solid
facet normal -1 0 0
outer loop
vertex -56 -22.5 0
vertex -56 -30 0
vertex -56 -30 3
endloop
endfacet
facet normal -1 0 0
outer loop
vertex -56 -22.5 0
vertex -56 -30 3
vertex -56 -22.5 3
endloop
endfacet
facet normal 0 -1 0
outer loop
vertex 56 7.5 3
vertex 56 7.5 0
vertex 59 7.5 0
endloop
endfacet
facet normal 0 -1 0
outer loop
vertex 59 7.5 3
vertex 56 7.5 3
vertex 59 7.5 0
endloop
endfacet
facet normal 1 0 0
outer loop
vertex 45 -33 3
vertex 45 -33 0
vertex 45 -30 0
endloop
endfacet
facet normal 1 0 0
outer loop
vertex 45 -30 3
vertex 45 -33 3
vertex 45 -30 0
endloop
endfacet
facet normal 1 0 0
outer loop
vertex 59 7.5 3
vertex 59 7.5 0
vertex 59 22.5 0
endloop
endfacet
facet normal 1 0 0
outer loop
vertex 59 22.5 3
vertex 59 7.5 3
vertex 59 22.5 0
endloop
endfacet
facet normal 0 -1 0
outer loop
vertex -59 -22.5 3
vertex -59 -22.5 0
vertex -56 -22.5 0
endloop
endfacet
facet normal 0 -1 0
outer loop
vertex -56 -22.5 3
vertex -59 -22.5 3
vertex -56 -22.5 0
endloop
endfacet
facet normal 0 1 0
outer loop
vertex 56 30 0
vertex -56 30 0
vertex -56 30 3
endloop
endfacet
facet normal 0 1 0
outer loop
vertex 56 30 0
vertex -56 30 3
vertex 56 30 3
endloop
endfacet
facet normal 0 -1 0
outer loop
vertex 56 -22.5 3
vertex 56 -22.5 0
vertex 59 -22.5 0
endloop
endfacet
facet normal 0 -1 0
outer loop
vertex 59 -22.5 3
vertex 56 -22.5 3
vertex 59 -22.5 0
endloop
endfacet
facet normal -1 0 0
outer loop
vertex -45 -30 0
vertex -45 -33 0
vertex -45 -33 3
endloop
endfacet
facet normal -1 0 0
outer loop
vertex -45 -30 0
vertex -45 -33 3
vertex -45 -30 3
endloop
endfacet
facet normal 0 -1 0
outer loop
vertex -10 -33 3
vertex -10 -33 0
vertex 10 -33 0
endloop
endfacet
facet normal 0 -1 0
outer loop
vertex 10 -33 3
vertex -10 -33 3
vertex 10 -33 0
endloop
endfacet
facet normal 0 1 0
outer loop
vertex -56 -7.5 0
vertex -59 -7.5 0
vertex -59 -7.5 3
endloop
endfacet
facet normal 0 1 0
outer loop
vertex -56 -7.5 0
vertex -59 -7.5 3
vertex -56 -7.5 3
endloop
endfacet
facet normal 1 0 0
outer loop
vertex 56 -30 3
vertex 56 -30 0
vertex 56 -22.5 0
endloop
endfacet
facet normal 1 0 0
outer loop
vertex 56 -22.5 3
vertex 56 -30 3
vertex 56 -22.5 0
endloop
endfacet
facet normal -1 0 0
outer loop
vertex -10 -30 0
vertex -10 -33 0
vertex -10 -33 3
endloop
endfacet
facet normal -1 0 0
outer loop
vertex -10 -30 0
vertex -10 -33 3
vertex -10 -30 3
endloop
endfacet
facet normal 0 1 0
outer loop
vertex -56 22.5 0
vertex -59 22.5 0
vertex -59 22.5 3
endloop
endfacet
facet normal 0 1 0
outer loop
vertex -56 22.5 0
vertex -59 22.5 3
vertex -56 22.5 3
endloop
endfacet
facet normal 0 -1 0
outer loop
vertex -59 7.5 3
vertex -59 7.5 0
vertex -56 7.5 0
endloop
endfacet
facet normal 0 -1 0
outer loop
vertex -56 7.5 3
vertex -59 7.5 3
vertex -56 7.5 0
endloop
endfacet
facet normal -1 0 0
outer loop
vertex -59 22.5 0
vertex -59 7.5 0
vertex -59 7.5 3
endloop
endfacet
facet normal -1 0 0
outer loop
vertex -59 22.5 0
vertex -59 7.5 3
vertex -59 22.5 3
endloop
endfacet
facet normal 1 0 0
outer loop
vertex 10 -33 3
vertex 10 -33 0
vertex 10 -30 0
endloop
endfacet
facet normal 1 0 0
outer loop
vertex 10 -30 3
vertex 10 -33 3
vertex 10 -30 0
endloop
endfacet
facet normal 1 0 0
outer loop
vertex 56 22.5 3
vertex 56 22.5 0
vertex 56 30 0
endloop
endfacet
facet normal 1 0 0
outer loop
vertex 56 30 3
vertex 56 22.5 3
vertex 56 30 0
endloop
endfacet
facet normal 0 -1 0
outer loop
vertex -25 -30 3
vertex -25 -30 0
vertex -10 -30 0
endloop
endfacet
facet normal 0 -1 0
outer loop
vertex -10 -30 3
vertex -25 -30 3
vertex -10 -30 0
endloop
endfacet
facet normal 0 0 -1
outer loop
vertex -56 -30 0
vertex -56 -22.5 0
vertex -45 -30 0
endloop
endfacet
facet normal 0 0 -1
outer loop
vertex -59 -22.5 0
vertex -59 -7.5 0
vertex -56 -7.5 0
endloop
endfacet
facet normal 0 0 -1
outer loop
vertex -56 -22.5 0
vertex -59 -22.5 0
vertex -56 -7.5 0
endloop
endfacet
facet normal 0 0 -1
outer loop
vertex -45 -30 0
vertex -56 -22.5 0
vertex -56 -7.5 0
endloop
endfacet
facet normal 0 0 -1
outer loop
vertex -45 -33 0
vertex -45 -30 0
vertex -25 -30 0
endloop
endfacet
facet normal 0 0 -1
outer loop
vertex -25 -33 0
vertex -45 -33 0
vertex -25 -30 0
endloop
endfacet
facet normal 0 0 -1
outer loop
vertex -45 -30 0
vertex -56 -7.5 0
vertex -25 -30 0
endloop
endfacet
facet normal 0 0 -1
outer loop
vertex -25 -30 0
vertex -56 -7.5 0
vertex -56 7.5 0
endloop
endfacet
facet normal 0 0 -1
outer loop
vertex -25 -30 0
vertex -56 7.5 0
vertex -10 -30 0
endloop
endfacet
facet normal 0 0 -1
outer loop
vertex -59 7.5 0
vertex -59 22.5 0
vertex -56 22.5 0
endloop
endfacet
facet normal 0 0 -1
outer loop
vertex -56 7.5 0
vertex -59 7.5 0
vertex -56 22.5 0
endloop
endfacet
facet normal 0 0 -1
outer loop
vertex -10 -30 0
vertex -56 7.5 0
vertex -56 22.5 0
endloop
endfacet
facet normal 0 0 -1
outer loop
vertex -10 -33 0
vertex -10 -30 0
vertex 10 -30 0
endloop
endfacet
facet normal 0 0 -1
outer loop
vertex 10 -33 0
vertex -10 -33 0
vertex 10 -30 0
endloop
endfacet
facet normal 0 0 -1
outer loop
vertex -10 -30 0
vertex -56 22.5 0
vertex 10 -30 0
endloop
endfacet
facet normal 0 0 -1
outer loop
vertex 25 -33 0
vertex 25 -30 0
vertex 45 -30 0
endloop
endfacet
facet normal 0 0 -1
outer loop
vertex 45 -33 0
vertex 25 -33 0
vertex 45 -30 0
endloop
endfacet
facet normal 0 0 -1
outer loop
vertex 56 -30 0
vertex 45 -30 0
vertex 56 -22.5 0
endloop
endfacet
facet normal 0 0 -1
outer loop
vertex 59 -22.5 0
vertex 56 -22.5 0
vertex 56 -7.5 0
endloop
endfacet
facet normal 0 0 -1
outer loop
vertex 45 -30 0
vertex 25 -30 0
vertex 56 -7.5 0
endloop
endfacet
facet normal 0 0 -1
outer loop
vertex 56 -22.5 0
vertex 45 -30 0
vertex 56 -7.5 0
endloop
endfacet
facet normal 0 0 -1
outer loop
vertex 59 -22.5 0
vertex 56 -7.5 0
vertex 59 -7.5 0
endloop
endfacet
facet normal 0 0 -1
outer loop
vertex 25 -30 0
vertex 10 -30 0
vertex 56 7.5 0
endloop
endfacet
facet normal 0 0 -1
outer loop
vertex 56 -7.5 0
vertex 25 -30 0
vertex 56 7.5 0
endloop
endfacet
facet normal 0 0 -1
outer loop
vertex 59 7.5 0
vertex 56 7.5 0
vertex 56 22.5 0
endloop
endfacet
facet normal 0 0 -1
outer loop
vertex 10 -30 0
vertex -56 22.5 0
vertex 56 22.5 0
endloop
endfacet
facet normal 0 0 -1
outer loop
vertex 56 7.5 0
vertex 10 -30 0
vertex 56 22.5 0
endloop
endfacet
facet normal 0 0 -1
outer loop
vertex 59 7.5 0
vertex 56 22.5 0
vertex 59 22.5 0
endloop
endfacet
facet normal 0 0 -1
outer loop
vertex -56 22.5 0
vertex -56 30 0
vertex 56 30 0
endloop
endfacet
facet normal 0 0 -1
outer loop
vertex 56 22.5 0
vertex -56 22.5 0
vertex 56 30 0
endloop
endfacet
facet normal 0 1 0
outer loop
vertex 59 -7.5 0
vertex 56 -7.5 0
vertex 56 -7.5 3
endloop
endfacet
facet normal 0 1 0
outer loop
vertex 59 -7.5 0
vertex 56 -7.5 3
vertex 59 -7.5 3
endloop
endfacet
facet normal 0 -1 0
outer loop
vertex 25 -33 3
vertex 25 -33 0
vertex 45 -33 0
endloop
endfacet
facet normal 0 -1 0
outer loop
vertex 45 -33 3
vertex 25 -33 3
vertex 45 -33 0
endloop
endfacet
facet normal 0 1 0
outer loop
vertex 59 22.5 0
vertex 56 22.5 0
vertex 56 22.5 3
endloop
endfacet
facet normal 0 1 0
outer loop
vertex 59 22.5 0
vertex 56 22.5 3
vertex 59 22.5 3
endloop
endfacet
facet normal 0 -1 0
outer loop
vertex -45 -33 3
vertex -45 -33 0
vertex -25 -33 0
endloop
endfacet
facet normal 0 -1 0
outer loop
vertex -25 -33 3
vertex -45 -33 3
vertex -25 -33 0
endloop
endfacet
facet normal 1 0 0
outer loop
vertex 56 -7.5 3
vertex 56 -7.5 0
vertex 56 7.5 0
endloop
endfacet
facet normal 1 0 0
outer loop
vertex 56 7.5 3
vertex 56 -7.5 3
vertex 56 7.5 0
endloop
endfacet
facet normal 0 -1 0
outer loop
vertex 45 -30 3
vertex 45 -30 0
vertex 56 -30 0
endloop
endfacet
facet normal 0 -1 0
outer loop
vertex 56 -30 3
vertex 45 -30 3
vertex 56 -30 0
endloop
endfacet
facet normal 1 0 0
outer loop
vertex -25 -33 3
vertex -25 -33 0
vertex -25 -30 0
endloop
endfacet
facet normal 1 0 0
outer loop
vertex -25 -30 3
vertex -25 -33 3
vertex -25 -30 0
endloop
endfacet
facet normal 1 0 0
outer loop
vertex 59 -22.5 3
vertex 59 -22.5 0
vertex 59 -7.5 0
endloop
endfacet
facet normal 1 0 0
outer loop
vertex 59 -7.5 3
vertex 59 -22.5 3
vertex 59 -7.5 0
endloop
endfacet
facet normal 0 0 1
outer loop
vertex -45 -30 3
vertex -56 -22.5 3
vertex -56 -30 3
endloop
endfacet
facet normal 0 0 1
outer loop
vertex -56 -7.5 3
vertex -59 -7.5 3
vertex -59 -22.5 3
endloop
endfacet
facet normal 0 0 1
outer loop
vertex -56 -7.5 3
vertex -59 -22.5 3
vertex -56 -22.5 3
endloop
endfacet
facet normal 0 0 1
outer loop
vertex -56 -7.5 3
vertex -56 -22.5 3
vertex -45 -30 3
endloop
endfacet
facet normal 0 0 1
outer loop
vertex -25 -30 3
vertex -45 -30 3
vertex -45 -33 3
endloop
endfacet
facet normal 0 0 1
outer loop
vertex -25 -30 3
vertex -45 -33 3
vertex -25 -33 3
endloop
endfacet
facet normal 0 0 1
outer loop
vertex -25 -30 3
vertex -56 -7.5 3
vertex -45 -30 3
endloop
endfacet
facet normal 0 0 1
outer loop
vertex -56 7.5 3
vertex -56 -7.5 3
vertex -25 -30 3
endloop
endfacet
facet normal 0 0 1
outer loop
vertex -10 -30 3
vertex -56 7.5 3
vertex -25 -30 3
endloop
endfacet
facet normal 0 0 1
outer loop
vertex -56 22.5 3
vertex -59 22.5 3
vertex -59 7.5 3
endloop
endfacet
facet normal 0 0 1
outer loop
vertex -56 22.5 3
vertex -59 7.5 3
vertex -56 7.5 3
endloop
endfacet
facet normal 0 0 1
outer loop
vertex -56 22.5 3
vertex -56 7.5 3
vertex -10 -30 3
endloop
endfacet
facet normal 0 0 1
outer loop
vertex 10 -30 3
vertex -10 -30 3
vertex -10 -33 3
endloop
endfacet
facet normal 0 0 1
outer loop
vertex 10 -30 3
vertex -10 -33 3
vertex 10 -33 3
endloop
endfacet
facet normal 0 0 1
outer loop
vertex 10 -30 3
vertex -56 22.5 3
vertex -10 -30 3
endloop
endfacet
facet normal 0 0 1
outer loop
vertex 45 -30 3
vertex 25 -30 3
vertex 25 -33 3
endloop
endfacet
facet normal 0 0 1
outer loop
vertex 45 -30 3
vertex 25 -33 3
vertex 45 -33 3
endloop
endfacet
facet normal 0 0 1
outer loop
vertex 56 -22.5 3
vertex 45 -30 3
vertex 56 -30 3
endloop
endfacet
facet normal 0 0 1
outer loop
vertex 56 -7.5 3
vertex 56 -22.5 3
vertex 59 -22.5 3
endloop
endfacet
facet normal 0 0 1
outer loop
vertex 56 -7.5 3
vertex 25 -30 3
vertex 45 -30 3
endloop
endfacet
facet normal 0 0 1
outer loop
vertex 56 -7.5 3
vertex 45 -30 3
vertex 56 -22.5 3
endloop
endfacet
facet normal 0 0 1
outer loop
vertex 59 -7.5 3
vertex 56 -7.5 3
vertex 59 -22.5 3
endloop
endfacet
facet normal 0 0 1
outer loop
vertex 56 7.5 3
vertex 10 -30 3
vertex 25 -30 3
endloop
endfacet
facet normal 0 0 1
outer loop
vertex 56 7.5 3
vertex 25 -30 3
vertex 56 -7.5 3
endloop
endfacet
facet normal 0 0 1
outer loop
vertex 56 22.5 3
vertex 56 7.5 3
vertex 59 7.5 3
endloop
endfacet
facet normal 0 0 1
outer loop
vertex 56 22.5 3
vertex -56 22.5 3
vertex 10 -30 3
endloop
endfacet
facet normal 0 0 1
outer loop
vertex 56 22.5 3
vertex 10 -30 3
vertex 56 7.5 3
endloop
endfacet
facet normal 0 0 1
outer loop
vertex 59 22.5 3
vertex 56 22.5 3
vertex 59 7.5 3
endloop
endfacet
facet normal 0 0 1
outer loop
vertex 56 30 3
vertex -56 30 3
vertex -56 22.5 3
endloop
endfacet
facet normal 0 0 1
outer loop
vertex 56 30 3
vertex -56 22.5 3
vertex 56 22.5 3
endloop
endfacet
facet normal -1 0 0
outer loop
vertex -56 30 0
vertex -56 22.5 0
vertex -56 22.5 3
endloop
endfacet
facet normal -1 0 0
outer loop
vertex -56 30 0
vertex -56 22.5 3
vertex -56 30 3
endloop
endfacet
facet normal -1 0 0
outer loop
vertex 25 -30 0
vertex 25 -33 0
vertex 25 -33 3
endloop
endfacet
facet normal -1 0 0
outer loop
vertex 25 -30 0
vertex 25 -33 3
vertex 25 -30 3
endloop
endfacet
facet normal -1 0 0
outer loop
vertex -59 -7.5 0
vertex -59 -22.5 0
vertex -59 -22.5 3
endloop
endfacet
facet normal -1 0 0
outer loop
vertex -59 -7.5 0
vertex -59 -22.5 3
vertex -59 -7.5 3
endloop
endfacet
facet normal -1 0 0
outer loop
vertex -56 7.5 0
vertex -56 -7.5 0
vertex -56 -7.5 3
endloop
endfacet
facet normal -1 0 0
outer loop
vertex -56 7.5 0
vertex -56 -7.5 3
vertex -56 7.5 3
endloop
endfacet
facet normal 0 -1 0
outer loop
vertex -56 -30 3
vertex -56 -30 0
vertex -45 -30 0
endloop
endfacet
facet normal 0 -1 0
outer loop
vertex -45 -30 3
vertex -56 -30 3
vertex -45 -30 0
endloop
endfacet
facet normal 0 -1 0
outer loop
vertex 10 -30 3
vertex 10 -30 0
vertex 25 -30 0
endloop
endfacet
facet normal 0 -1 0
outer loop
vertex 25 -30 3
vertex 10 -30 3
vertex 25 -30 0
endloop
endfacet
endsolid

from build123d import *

# Parameters (mm, degrees)
SKETCH2_W           = 3
SKETCH2_H           = 15
SKETCH2_W_2         = 112
SKETCH2_H_2         = 60
SKETCH2_W_3         = 20
SKETCH2_H_3         = 3
BOSS_EXTRUDE1_DEPTH = 3


with BuildPart() as part:
    # Sketch2 → Boss-Extrude1 (new body)
    with BuildSketch(Plane.XY):
        with Locations((-57.5, 15)):
            Rectangle(SKETCH2_W, SKETCH2_H)
        with Locations((-57.5, -15)):
            Rectangle(SKETCH2_W, SKETCH2_H)
        Rectangle(SKETCH2_W_2, SKETCH2_H_2)
        with Locations((-35, -31.5)):
            Rectangle(SKETCH2_W_3, SKETCH2_H_3)
        with Locations((0, -31.5)):
            Rectangle(SKETCH2_W_3, SKETCH2_H_3)
        with Locations((35, -31.5)):
            Rectangle(SKETCH2_W_3, SKETCH2_H_3)
        with Locations((57.5, -15)):
            Rectangle(SKETCH2_W, SKETCH2_H)
        with Locations((57.5, 15)):
            Rectangle(SKETCH2_W, SKETCH2_H)
    extrude(amount=BOSS_EXTRUDE1_DEPTH)


solid = part.part
